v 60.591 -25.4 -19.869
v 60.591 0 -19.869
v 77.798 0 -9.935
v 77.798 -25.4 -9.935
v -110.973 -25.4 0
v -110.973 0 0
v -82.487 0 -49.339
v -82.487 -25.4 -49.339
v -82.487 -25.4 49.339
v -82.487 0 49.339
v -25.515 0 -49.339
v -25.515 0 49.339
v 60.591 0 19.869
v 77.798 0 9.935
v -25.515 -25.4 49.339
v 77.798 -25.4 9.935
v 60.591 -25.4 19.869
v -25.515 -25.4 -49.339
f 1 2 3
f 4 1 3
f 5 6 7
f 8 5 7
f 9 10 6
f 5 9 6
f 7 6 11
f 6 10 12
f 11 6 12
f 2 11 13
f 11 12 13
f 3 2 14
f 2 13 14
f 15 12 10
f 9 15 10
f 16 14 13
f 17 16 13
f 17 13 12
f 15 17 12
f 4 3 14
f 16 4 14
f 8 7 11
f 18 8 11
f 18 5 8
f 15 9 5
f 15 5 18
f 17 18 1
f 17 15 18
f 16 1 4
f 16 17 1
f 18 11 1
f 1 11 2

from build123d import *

# Parameters (mm, degrees)
F1_DEPTH = 25.4


with BuildPart() as f1:
    # F0 (on Front) → F1 (new body)
    with BuildSketch(Plane.XZ):
        Polygon((-25.515185, 49.338989), (-82.486942, 49.338989), (-110.97282, 0), (-82.486942, -49.338989), (-25.515185, -49.338989), (2.970694, 0), align=None)
        Polygon((60.591042, 19.869066), (-25.515185, 49.338989), (2.970694, 0), (-25.515185, -49.338989), (60.591042, -19.869066), (43.383926, -9.934533), (43.383926, 9.934533), align=None)
        Polygon((77.798158, 9.934533), (60.591042, 19.869066), (43.383926, 9.934533), (43.383926, -9.934533), (60.591042, -19.869066), (77.798158, -9.934533), align=None)
    extrude(amount=F1_DEPTH)


solid = f1.part
